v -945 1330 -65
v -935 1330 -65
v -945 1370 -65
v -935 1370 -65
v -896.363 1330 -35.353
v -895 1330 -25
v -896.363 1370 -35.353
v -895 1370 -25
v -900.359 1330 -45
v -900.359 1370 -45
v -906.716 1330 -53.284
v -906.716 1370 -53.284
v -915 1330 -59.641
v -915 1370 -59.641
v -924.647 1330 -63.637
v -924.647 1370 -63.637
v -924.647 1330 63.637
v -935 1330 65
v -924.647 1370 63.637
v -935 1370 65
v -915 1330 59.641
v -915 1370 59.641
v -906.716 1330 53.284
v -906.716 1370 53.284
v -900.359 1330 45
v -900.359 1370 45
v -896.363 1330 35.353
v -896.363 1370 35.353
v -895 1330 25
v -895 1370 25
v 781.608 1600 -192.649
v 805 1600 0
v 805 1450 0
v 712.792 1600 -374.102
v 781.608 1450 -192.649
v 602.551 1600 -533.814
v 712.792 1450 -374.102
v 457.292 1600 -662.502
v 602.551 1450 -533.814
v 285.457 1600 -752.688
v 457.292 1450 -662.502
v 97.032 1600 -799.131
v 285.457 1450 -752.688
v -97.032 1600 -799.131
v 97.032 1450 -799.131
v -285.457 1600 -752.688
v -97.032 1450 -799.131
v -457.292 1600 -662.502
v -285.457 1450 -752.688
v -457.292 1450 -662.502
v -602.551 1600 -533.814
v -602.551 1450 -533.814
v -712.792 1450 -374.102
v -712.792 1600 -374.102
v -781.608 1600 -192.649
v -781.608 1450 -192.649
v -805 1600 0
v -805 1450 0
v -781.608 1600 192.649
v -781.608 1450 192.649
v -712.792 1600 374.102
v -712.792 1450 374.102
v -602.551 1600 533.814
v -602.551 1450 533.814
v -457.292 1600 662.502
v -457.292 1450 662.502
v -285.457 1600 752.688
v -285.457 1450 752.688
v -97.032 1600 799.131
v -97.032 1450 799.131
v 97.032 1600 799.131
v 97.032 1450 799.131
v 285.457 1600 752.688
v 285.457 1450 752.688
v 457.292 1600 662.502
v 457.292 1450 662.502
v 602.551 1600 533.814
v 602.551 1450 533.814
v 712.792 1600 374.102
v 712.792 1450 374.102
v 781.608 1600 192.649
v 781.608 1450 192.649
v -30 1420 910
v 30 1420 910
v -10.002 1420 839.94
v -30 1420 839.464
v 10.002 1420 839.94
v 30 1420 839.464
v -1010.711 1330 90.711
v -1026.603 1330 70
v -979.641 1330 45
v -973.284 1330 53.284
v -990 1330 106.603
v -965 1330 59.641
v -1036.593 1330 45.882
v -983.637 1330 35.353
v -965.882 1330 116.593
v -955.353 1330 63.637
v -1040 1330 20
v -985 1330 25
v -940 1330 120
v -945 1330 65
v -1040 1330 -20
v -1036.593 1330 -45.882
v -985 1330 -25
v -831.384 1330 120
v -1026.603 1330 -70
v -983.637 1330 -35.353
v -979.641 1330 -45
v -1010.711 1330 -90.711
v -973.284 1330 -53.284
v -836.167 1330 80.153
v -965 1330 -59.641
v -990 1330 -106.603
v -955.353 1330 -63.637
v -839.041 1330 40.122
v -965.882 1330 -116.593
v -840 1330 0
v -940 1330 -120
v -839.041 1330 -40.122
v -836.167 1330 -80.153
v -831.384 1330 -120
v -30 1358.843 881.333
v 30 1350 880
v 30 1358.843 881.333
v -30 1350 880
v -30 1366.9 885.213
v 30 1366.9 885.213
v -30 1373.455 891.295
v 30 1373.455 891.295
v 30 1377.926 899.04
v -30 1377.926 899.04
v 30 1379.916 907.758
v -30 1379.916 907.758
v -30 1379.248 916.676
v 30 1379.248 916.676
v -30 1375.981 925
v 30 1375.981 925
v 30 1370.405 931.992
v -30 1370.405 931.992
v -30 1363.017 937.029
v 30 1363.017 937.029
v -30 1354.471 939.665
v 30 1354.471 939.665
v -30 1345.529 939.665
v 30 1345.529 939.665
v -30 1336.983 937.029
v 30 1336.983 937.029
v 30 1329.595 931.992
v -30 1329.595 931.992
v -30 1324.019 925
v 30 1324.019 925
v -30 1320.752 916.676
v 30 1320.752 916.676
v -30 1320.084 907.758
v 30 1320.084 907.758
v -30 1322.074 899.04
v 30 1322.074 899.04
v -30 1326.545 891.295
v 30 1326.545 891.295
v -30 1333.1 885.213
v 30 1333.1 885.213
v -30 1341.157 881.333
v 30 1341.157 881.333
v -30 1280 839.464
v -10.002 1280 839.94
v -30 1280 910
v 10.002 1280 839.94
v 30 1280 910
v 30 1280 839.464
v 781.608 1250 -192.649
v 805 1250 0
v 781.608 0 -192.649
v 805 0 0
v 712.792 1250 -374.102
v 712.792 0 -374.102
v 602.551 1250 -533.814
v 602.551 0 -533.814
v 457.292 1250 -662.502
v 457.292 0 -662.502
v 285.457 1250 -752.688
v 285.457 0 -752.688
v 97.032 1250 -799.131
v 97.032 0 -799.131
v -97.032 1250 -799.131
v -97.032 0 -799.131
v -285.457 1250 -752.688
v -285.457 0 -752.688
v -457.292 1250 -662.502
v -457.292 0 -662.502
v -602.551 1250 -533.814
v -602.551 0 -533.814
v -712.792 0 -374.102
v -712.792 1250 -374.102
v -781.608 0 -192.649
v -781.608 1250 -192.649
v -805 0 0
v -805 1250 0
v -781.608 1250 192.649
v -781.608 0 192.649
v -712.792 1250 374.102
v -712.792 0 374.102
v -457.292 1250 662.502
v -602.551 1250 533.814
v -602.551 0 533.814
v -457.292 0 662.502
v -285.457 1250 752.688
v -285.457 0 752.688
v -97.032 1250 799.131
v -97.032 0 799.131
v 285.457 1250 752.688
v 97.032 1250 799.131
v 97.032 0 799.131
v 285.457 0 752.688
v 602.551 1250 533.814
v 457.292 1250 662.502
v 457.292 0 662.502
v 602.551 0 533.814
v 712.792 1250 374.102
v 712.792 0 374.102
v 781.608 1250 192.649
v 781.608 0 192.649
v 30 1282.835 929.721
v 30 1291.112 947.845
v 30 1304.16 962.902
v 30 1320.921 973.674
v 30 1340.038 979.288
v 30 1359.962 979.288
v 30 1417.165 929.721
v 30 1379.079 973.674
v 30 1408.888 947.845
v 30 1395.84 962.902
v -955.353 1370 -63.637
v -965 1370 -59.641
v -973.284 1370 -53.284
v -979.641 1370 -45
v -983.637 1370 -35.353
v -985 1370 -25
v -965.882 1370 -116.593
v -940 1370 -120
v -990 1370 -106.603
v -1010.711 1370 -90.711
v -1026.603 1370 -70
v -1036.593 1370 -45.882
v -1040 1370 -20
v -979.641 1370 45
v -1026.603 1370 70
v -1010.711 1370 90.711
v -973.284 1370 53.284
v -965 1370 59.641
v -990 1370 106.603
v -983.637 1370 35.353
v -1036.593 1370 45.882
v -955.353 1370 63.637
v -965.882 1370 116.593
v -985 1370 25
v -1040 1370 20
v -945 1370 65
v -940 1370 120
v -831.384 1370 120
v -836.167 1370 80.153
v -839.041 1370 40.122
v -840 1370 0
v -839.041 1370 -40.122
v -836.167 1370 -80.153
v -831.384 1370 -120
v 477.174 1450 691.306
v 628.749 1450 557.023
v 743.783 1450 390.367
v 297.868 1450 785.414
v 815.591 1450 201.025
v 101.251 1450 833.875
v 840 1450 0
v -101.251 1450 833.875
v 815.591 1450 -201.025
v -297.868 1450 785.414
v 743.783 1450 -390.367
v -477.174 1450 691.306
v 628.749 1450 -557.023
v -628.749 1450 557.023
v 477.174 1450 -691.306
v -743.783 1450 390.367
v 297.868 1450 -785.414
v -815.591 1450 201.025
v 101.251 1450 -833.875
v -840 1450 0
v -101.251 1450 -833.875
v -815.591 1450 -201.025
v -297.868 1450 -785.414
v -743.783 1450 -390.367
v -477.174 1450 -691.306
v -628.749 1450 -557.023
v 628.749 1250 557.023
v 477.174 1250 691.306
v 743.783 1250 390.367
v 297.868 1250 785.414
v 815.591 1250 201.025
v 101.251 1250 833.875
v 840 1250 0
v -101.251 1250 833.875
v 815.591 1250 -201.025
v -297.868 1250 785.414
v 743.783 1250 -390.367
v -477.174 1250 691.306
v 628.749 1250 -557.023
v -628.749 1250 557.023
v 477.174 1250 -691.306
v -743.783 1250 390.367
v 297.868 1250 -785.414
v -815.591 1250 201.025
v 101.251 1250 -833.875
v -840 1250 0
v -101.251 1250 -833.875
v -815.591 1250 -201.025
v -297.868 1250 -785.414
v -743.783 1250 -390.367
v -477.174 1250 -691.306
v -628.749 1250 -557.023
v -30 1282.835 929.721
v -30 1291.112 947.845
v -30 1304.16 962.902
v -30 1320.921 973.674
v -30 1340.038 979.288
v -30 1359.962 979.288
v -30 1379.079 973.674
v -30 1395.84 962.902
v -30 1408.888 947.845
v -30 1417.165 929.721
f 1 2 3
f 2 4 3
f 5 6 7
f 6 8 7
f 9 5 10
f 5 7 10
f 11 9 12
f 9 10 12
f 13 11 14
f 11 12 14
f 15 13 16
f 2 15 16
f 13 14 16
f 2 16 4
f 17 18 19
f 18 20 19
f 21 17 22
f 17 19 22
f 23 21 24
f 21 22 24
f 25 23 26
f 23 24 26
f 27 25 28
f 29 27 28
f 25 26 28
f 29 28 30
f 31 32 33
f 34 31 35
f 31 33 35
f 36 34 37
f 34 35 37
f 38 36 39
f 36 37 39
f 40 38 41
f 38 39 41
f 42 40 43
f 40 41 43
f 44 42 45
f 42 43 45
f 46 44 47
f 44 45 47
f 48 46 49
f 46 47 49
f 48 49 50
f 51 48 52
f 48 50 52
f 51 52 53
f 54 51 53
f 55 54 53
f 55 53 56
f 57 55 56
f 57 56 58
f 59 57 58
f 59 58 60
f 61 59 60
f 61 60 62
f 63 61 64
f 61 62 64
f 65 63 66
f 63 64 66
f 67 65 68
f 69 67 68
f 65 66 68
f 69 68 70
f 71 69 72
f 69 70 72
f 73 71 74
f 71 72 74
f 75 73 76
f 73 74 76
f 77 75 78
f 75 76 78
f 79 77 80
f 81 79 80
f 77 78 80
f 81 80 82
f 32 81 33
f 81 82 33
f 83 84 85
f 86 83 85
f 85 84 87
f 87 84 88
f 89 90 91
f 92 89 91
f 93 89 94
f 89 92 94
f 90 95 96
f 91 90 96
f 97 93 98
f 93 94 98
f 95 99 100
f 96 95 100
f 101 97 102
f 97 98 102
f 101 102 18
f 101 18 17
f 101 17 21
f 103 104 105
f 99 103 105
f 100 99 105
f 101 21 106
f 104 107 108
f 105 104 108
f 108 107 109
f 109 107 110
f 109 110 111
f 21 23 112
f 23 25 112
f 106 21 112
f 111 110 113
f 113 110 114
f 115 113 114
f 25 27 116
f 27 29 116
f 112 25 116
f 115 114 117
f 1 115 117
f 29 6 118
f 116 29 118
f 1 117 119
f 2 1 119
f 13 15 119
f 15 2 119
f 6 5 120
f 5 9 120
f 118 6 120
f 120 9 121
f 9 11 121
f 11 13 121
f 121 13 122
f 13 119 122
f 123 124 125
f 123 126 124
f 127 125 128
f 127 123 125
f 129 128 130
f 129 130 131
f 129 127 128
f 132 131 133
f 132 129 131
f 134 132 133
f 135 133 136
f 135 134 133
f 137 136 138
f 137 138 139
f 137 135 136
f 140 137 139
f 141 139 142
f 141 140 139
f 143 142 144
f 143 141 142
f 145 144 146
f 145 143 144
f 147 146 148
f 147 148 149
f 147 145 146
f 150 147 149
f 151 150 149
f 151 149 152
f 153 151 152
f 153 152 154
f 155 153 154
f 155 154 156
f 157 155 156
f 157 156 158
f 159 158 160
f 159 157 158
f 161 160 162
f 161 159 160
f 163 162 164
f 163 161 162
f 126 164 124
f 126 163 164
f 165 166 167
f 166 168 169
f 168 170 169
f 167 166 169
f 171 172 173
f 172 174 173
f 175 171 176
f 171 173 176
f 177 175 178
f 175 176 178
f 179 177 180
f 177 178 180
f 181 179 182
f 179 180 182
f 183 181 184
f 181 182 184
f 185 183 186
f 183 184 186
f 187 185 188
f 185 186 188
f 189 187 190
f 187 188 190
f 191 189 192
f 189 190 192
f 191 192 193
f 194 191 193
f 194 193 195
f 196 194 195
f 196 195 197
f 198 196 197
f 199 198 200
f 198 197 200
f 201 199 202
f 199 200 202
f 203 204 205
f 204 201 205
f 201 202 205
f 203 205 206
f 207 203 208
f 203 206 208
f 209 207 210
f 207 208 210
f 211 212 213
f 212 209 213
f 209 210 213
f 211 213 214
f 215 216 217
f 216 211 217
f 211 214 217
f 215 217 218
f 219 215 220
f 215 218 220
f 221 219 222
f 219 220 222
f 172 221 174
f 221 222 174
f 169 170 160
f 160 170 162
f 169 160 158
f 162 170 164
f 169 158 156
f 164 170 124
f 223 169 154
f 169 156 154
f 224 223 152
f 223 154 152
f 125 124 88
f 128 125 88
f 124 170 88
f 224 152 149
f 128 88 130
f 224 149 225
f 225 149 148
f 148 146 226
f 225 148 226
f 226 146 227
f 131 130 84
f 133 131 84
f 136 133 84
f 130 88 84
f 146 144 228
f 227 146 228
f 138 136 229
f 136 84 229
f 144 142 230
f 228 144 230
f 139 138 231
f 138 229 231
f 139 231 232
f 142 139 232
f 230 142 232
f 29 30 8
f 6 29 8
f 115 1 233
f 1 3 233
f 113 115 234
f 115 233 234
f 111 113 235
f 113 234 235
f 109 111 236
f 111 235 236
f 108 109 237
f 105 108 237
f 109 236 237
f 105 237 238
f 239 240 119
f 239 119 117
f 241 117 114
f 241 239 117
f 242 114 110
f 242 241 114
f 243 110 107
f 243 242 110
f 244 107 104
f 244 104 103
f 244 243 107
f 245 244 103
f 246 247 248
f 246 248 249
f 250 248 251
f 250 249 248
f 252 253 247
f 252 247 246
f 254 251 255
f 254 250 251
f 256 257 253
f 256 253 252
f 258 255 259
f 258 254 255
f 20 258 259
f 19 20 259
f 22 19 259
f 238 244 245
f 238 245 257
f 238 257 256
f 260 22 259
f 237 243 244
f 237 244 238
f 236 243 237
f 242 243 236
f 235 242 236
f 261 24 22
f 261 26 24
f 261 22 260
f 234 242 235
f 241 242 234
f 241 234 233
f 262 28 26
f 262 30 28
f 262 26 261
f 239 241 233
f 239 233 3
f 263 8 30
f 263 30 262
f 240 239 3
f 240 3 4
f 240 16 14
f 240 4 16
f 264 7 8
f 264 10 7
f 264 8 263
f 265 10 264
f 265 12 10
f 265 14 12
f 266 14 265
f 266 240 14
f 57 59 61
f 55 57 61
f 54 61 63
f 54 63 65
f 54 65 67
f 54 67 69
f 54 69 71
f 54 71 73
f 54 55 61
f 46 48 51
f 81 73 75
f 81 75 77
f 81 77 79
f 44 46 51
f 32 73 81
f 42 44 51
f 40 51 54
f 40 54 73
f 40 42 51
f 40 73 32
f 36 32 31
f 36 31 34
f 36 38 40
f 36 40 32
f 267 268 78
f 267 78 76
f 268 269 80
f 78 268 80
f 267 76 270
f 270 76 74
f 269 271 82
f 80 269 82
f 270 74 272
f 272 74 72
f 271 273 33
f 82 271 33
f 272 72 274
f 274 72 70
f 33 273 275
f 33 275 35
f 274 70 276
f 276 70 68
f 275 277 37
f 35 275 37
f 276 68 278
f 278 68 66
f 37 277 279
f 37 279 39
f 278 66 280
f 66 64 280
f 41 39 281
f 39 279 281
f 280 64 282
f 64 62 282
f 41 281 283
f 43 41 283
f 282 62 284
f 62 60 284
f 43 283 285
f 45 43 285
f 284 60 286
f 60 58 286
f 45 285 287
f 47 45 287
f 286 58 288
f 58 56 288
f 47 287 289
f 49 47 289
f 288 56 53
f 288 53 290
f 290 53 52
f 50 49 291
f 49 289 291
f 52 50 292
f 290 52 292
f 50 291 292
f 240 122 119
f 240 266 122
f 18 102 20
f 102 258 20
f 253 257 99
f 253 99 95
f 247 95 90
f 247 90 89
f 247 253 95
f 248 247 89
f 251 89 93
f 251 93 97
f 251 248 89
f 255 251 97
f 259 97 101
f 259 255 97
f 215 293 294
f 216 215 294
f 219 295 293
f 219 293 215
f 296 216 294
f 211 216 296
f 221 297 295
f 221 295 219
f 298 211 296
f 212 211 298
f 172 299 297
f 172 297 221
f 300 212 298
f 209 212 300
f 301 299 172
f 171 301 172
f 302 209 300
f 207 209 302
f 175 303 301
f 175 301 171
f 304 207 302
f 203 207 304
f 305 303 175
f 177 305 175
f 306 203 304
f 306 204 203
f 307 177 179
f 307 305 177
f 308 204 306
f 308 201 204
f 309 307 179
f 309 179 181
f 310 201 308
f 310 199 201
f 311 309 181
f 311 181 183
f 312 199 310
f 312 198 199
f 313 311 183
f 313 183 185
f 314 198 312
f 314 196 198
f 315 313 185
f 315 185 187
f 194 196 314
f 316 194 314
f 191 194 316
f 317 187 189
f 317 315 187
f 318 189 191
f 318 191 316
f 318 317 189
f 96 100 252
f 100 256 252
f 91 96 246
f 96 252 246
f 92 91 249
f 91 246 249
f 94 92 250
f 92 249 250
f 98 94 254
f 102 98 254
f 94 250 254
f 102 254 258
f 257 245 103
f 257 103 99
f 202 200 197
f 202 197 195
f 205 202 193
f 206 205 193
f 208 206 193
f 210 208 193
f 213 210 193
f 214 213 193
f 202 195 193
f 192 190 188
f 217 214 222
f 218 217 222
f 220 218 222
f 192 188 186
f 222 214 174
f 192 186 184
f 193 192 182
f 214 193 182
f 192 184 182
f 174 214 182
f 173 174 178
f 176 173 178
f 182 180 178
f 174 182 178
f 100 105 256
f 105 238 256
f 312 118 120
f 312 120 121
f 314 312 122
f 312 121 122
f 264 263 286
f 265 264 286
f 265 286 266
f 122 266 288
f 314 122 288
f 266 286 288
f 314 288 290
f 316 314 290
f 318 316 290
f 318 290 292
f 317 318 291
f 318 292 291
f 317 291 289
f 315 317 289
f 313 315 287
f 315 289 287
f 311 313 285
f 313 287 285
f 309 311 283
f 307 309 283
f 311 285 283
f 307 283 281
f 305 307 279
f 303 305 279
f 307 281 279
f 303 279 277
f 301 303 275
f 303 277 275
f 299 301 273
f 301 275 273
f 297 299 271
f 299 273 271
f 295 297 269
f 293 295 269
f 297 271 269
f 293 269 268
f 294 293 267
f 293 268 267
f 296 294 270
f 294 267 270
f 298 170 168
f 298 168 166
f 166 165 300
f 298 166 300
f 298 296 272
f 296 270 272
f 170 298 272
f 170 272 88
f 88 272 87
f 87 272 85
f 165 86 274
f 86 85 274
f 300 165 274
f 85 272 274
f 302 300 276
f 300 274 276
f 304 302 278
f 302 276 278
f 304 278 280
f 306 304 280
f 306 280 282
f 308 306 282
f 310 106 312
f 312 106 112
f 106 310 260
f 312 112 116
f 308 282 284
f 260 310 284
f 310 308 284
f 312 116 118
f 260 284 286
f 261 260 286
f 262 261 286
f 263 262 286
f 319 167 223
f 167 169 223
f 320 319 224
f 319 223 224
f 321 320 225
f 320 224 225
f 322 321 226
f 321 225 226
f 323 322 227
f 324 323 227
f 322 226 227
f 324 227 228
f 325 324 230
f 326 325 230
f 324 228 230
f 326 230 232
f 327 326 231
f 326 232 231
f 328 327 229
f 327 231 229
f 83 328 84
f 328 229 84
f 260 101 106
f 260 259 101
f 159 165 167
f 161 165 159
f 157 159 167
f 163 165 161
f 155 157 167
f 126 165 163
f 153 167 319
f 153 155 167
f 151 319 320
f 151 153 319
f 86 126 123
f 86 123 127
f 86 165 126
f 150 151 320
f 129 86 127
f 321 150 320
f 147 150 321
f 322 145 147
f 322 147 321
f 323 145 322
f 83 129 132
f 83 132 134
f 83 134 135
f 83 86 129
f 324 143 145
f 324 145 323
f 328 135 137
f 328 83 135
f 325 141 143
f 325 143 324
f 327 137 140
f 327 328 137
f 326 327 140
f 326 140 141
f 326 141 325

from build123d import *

# Parameters (mm, degrees)
SKETCH_2_W      = 40
SKETCH_2_H      = 200
SKETCH_3_R      = 30
EXTRUDE_1_DEPTH = 30
EXTRUDE_2_DEPTH = 20
SKETCH_6_R      = 805
SKETCH_5_R      = 805


with BuildPart() as part:
    # Эскиз2 → Повернуть2 (revolve)
    with BuildSketch(Plane.XY):
        with Locations((-820, 1350)):
            Rectangle(SKETCH_2_W, SKETCH_2_H)
    revolve(axis=Axis((0, 1662.873032591, 0), (0, -1, 0)))

    # Эскиз3 → Бобышка-Вытянуть1 (add, symmetric)
    with BuildSketch(Plane(origin=(0, 0, 0), x_dir=(0, 0, -1), z_dir=(1, 0, 0))):
        with BuildLine():
            Line((-800, 1280), (-910, 1280))
            ThreePointArc((-910, 1280), (-980, 1350), (-910, 1420))
            Line((-910, 1420), (-800, 1420))
            Line((-800, 1420), (-800, 1280))
        make_face()
        with Locations((-910, 1350)):
            Circle(SKETCH_3_R, mode=Mode.SUBTRACT)
    extrude(amount=EXTRUDE_1_DEPTH, both=True)

    # Эскиз4 → Бобышка-Вытянуть2 (add, symmetric)
    with BuildSketch(Plane(origin=(0, 1350, 0), x_dir=(1, 0, 0), z_dir=(0, 1, 0))):
        with BuildLine():
            Line((-831.384387633, 120), (-940, 120))
            ThreePointArc((-940, 120), (-1010.710678119, 90.710678119), (-1040, 20))
            Line((-1040, 20), (-1040, -20))
            ThreePointArc((-1040, -20), (-1010.710678119, -90.710678119), (-940, -120))
            Line((-940, -120), (-831.384387633, -120))
            ThreePointArc((-831.384387633, -120), (-840, 0), (-831.384387633, 120))
        make_face()
        with BuildLine():
            Line((-895, -25), (-895, 25))
            ThreePointArc((-895, 25), (-906.715728753, 53.284271247), (-935, 65))
            Line((-935, 65), (-945, 65))
            ThreePointArc((-945, 65), (-973.284271247, 53.284271247), (-985, 25))
            Line((-985, 25), (-985, -25))
            ThreePointArc((-985, -25), (-973.284271247, -53.284271247), (-945, -65))
            Line((-945, -65), (-935, -65))
            ThreePointArc((-935, -65), (-906.715728753, -53.284271247), (-895, -25))
        make_face(mode=Mode.SUBTRACT)
    extrude(amount=EXTRUDE_2_DEPTH, both=True)

    # Эскиз6 → По сечениям2 section 0
    with BuildSketch(Plane(origin=(0, 1600, 0), x_dir=(1, 0, 0), z_dir=(0, 1, 0))):
        Circle(SKETCH_6_R)
    # Эскиз5 → По сечениям2 section 1
    with BuildSketch(Plane(origin=(0, 0, 0), x_dir=(1, 0, 0), z_dir=(0, 1, 0))):
        Circle(SKETCH_5_R)
    loft()


solid = part.part
